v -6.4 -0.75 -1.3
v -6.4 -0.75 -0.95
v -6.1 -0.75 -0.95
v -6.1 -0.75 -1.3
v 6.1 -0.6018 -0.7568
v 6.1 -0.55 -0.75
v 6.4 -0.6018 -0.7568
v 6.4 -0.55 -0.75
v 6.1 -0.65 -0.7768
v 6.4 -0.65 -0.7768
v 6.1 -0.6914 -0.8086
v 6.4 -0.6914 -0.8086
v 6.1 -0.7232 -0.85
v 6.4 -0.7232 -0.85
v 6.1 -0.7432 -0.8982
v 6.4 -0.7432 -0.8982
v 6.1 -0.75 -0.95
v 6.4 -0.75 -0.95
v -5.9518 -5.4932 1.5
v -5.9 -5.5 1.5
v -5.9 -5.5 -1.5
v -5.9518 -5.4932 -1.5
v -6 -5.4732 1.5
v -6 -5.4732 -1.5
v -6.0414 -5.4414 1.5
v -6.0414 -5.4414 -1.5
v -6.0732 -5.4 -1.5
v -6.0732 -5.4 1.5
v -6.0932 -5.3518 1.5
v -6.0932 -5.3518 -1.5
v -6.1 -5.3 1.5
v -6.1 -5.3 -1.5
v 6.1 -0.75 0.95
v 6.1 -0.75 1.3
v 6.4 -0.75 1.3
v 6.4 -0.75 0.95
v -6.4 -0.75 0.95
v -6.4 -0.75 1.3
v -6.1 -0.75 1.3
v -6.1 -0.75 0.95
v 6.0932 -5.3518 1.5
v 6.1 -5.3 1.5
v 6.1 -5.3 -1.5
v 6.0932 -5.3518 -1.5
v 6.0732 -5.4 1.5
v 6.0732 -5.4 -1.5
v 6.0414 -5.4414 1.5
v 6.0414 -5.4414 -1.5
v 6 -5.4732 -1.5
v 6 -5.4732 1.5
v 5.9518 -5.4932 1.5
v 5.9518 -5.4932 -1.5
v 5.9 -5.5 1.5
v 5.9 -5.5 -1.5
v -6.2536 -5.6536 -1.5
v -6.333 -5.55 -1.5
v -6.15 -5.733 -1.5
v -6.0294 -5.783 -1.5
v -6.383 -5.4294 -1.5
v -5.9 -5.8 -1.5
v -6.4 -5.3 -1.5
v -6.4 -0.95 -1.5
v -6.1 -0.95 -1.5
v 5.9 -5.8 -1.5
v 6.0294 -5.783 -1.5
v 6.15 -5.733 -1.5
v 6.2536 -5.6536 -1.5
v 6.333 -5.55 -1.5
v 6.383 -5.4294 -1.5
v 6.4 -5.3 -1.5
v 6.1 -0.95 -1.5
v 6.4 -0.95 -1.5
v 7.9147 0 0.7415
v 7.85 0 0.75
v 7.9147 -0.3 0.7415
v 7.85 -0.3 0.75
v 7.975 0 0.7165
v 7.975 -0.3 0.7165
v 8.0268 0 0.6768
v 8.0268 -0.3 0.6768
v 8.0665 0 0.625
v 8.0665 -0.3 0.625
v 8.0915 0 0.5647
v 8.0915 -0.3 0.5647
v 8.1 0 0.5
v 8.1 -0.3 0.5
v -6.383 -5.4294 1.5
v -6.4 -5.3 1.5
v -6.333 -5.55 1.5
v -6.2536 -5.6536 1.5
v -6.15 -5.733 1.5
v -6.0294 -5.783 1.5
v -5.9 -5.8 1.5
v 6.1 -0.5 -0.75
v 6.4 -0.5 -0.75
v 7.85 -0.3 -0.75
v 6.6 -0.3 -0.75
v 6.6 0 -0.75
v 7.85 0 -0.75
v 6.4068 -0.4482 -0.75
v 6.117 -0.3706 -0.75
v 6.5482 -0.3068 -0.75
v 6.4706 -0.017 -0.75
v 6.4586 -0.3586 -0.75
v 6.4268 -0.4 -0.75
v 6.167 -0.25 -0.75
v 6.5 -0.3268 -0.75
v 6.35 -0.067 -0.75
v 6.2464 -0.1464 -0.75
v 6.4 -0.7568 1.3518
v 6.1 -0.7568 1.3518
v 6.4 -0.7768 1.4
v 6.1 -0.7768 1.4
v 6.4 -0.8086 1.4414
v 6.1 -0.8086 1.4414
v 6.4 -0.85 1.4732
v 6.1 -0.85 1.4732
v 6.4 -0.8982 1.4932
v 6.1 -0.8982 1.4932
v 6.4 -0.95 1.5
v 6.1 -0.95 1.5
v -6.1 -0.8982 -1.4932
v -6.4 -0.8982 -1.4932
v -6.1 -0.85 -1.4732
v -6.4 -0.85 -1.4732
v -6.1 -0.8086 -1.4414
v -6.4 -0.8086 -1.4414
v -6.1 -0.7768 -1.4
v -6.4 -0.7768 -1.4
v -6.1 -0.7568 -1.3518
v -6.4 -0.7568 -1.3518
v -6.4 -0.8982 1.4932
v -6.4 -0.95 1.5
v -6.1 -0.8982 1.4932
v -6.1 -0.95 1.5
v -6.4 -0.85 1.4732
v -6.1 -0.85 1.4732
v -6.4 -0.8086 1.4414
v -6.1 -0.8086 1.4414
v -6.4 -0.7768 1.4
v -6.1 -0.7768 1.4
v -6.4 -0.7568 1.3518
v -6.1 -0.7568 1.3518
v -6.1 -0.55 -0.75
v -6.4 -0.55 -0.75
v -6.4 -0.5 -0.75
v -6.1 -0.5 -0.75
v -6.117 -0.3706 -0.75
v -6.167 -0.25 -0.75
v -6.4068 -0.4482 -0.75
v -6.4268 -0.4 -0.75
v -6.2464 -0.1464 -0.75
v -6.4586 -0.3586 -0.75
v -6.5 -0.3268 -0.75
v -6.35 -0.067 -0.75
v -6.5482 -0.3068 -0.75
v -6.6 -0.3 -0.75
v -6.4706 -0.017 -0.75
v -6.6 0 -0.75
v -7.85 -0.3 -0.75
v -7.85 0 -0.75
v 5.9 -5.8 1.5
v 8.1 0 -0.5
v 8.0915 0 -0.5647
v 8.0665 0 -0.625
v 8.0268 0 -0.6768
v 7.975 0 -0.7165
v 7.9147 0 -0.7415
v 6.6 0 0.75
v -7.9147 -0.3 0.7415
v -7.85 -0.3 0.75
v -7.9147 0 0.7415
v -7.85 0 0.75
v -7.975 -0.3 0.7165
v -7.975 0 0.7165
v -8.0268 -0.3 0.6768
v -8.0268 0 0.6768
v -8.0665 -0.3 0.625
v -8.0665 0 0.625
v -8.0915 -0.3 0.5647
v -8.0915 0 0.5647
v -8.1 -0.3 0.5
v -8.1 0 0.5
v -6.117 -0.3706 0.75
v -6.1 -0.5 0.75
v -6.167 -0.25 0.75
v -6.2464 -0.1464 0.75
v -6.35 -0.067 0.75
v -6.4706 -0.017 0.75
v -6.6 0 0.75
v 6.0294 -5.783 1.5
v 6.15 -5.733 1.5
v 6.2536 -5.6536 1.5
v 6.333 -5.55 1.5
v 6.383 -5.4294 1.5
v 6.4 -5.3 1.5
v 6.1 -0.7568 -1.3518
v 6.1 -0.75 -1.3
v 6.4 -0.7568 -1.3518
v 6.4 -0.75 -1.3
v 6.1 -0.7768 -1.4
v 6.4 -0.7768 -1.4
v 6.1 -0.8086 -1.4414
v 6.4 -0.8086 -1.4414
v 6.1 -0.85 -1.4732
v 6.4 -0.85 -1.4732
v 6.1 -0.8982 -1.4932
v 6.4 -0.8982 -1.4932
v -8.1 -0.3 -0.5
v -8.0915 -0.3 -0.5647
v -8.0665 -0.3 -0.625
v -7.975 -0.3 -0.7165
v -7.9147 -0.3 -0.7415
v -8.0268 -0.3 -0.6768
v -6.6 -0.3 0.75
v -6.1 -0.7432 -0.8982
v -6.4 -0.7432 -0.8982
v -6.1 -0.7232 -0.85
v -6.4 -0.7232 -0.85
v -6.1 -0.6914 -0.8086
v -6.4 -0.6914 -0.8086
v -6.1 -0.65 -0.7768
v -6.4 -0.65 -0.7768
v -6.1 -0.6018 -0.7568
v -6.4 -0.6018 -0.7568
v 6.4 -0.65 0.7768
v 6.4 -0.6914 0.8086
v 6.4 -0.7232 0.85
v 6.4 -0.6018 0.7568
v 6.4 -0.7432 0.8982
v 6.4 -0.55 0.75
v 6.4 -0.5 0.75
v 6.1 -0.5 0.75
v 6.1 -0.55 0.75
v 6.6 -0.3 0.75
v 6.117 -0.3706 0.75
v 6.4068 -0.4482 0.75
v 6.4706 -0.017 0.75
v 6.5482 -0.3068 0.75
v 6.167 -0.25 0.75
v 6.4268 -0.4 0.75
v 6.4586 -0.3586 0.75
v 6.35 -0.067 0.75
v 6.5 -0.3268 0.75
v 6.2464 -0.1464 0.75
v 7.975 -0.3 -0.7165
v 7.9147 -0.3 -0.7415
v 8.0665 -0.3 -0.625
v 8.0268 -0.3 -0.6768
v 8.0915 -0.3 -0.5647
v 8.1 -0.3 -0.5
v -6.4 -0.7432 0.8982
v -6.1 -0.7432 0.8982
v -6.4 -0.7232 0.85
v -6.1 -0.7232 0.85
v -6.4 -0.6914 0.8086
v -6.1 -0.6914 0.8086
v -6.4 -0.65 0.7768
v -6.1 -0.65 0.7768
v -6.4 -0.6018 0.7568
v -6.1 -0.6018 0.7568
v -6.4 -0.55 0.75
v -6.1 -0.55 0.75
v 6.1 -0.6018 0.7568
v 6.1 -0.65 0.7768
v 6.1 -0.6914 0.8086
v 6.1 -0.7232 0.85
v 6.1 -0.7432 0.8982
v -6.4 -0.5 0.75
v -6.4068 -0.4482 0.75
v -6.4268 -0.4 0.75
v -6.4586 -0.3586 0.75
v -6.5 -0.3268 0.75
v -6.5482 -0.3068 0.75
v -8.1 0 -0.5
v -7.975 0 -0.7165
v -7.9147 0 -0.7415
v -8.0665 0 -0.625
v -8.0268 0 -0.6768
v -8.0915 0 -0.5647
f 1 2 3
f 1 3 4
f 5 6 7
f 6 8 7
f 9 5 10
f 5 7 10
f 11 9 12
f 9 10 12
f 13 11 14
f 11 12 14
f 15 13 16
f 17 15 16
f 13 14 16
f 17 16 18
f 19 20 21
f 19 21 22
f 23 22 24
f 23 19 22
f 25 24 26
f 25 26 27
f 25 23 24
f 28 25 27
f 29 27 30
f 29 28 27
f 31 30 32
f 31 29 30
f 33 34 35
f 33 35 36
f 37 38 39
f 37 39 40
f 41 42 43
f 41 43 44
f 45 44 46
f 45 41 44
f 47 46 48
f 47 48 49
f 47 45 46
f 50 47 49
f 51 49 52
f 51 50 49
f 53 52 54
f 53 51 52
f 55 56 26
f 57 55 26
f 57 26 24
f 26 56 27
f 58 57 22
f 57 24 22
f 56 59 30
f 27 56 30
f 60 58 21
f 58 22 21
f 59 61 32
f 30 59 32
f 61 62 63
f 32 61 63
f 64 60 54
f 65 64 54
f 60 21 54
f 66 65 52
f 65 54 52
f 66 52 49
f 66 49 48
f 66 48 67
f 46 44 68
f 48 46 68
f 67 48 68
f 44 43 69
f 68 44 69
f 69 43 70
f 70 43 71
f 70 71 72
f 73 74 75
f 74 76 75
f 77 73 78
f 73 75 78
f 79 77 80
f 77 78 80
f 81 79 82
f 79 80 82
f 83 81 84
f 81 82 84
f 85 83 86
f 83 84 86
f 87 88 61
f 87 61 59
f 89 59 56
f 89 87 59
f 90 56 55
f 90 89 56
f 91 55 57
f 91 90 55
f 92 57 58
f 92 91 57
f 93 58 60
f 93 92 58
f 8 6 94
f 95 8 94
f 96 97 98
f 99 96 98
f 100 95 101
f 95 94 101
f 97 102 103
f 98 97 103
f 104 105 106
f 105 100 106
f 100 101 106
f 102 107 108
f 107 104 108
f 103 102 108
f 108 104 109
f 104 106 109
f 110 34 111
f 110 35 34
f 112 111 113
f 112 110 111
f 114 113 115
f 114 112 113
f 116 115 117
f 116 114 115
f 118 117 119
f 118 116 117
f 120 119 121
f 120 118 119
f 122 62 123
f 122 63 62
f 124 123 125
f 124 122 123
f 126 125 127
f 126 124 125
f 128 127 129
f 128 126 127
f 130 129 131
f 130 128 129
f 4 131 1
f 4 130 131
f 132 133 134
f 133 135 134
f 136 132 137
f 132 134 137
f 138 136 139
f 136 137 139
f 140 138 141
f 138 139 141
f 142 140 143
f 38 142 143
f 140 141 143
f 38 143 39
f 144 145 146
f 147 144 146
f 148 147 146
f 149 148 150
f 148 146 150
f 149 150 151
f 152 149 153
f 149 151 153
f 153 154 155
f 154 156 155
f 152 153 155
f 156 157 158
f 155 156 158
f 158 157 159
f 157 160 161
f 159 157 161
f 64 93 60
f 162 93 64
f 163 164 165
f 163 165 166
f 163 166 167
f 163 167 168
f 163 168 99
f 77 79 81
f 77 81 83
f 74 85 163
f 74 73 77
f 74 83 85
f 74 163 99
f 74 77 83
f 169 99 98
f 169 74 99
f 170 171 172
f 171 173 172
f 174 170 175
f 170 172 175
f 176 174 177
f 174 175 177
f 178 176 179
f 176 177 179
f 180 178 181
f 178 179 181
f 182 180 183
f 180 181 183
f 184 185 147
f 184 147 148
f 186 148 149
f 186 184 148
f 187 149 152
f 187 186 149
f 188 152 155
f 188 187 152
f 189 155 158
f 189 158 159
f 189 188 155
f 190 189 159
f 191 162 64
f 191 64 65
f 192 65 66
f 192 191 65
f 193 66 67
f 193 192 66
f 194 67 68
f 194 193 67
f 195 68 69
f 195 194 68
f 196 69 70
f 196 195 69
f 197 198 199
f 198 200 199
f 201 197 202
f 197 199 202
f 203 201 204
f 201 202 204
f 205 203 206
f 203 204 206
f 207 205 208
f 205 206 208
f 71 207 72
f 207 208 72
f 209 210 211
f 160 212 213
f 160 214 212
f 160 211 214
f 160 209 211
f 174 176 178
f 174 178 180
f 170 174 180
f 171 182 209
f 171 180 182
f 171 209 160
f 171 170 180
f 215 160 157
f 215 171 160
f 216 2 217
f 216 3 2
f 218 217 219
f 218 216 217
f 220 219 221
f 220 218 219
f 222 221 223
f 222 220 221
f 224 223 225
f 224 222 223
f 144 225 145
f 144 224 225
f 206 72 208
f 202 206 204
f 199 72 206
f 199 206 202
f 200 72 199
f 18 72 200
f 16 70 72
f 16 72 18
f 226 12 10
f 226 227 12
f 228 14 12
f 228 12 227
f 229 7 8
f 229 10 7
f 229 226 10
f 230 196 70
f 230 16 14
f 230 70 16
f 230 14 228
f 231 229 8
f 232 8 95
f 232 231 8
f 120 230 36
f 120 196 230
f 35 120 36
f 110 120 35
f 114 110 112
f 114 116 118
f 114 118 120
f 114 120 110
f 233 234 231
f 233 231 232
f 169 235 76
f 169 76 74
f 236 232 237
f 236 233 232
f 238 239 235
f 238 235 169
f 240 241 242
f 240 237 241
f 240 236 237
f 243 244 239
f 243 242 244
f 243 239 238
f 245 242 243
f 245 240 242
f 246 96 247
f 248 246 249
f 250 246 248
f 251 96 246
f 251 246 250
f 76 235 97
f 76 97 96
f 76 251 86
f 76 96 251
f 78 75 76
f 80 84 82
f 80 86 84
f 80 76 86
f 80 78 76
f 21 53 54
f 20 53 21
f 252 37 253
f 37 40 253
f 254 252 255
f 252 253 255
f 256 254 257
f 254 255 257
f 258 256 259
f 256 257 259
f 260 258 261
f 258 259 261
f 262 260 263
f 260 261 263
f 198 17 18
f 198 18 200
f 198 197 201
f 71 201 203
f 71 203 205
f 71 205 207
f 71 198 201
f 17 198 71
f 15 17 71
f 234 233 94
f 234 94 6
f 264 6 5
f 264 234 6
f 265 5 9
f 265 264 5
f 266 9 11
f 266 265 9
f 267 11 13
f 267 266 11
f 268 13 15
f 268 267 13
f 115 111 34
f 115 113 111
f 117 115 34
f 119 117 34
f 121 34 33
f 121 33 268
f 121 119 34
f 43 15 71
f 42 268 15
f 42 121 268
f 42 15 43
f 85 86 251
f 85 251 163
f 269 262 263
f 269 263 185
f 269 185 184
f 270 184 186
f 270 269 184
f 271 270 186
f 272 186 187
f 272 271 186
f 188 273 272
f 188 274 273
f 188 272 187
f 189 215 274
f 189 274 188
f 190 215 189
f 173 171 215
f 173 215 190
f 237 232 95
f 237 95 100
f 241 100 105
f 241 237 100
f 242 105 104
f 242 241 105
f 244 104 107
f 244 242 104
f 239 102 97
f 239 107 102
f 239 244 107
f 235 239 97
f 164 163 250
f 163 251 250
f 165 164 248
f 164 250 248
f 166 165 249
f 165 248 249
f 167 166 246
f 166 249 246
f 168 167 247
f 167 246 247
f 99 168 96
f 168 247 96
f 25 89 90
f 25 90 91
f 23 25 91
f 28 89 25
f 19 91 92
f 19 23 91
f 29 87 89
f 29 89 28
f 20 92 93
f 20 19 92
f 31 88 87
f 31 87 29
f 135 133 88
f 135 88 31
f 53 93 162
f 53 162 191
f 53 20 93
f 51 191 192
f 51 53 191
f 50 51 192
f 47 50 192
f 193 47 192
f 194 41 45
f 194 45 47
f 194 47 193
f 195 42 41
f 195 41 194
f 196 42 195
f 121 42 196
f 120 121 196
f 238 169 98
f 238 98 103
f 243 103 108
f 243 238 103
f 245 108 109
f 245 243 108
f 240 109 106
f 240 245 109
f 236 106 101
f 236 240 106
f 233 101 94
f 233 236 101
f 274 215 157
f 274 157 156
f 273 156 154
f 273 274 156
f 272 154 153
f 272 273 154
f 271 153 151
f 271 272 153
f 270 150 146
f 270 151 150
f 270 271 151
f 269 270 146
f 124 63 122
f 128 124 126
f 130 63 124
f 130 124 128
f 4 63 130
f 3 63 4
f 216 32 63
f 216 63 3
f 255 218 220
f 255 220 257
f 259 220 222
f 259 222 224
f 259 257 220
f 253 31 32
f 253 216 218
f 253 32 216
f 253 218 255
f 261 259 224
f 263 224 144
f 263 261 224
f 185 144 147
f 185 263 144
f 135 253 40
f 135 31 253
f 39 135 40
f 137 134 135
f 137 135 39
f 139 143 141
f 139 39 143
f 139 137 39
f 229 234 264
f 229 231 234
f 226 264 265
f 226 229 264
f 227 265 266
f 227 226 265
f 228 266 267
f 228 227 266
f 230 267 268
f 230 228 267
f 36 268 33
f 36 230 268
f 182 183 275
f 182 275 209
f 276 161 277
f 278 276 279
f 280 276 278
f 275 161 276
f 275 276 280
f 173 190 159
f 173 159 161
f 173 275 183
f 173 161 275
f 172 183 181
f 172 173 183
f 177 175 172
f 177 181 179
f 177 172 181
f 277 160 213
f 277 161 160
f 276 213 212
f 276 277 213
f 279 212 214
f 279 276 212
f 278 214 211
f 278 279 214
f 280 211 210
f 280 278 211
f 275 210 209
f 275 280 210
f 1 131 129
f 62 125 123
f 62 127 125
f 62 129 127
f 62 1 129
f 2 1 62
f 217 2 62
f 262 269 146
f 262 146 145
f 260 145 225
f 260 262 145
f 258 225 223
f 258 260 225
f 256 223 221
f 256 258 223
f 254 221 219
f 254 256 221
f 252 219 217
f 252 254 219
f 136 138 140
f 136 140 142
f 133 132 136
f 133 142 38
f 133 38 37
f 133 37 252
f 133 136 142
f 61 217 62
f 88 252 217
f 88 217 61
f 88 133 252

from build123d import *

# Parameters (mm, degrees)
BASE_FLANGE1_DEPTH      = 1.5
CUT_EXTRUDE1_DEPTH      = 11.07472084
CUT_EXTRUDE1_DEPTH_BACK = 11.07472084
SKETCH6_W               = 0.75
SKETCH6_H               = 3.25
FILLET1_R               = 0.2
FILLET2_R               = 0.25


# Sheet-metal steps are written as plain solids
with BuildPart() as part:
    # Sketch1 → Base-Flange1 (new, symmetric)
    with BuildSketch(Plane.XY):
        with BuildLine():
            Line((8.1, 0), (6.6, 0))
            ThreePointArc((6.6, 0), (6.246446609, -0.146446609), (6.1, -0.5))
            Line((6.1, -0.5), (6.1, -5.3))
            ThreePointArc((6.1, -5.3), (6.041421356, -5.441421356), (5.9, -5.5))
            Line((5.9, -5.5), (-5.9, -5.5))
            ThreePointArc((-5.9, -5.5), (-6.041421356, -5.441421356), (-6.1, -5.3))
            Line((-6.1, -5.3), (-6.1, -0.5))
            ThreePointArc((-6.1, -0.5), (-6.246446609, -0.146446609), (-6.6, 0))
            Line((-6.6, 0), (-8.1, 0))
            Line((-8.1, 0), (-8.1, -0.3))
            Line((-8.1, -0.3), (-6.6, -0.3))
            ThreePointArc((-6.6, -0.3), (-6.458578644, -0.358578644), (-6.4, -0.5))
            Line((-6.4, -0.5), (-6.4, -5.3))
            ThreePointArc((-6.4, -5.3), (-6.253553391, -5.653553391), (-5.9, -5.8))
            Line((-5.9, -5.8), (5.9, -5.8))
            ThreePointArc((5.9, -5.8), (6.253553391, -5.653553391), (6.4, -5.3))
            Line((6.4, -5.3), (6.4, -0.5))
            ThreePointArc((6.4, -0.5), (6.458578644, -0.358578644), (6.6, -0.3))
            Line((6.6, -0.3), (8.1, -0.3))
            Line((8.1, -0.3), (8.1, 0))
        make_face()
    extrude(amount=BASE_FLANGE1_DEPTH, both=True)

    # Sketch6 → Cut-Extrude1 (cut, two sides: drawn at the far end of the back side and taken through both)
    with BuildSketch(Plane(origin=(0, 0, 0), x_dir=(0, 0, -1), z_dir=(1, 0, 0)).offset(-CUT_EXTRUDE1_DEPTH_BACK)):
        with Locations((1.125, 0.875)):
            Rectangle(SKETCH6_W, SKETCH6_H)
        with Locations((-1.125, 0.875)):
            Rectangle(SKETCH6_W, SKETCH6_H)
    extrude(amount=CUT_EXTRUDE1_DEPTH + CUT_EXTRUDE1_DEPTH_BACK, mode=Mode.SUBTRACT)

    # Fillet1
    fillet1_edges = [part.edges().sort_by_distance(p)[0] for p in [
        (6.25, -0.75, -1.5),
        (-6.25, -0.75, -1.5),
        (6.25, -0.75, -0.75),
        (-6.25, -0.75, -0.75),
        (6.25, -0.75, 1.5),
        (-6.25, -0.75, 1.5),
        (6.25, -0.75, 0.75),
        (-6.25, -0.75, 0.75),
    ]]
    fillet(fillet1_edges, radius=FILLET1_R)

    # Fillet2
    fillet2_edges = [part.edges().sort_by_distance(p)[0] for p in [
        (-8.1, -0.15, -0.75),
        (8.1, -0.15, -0.75),
        (8.1, -0.15, 0.75),
        (-8.1, -0.15, 0.75),
    ]]
    fillet(fillet2_edges, radius=FILLET2_R)


solid = part.part
